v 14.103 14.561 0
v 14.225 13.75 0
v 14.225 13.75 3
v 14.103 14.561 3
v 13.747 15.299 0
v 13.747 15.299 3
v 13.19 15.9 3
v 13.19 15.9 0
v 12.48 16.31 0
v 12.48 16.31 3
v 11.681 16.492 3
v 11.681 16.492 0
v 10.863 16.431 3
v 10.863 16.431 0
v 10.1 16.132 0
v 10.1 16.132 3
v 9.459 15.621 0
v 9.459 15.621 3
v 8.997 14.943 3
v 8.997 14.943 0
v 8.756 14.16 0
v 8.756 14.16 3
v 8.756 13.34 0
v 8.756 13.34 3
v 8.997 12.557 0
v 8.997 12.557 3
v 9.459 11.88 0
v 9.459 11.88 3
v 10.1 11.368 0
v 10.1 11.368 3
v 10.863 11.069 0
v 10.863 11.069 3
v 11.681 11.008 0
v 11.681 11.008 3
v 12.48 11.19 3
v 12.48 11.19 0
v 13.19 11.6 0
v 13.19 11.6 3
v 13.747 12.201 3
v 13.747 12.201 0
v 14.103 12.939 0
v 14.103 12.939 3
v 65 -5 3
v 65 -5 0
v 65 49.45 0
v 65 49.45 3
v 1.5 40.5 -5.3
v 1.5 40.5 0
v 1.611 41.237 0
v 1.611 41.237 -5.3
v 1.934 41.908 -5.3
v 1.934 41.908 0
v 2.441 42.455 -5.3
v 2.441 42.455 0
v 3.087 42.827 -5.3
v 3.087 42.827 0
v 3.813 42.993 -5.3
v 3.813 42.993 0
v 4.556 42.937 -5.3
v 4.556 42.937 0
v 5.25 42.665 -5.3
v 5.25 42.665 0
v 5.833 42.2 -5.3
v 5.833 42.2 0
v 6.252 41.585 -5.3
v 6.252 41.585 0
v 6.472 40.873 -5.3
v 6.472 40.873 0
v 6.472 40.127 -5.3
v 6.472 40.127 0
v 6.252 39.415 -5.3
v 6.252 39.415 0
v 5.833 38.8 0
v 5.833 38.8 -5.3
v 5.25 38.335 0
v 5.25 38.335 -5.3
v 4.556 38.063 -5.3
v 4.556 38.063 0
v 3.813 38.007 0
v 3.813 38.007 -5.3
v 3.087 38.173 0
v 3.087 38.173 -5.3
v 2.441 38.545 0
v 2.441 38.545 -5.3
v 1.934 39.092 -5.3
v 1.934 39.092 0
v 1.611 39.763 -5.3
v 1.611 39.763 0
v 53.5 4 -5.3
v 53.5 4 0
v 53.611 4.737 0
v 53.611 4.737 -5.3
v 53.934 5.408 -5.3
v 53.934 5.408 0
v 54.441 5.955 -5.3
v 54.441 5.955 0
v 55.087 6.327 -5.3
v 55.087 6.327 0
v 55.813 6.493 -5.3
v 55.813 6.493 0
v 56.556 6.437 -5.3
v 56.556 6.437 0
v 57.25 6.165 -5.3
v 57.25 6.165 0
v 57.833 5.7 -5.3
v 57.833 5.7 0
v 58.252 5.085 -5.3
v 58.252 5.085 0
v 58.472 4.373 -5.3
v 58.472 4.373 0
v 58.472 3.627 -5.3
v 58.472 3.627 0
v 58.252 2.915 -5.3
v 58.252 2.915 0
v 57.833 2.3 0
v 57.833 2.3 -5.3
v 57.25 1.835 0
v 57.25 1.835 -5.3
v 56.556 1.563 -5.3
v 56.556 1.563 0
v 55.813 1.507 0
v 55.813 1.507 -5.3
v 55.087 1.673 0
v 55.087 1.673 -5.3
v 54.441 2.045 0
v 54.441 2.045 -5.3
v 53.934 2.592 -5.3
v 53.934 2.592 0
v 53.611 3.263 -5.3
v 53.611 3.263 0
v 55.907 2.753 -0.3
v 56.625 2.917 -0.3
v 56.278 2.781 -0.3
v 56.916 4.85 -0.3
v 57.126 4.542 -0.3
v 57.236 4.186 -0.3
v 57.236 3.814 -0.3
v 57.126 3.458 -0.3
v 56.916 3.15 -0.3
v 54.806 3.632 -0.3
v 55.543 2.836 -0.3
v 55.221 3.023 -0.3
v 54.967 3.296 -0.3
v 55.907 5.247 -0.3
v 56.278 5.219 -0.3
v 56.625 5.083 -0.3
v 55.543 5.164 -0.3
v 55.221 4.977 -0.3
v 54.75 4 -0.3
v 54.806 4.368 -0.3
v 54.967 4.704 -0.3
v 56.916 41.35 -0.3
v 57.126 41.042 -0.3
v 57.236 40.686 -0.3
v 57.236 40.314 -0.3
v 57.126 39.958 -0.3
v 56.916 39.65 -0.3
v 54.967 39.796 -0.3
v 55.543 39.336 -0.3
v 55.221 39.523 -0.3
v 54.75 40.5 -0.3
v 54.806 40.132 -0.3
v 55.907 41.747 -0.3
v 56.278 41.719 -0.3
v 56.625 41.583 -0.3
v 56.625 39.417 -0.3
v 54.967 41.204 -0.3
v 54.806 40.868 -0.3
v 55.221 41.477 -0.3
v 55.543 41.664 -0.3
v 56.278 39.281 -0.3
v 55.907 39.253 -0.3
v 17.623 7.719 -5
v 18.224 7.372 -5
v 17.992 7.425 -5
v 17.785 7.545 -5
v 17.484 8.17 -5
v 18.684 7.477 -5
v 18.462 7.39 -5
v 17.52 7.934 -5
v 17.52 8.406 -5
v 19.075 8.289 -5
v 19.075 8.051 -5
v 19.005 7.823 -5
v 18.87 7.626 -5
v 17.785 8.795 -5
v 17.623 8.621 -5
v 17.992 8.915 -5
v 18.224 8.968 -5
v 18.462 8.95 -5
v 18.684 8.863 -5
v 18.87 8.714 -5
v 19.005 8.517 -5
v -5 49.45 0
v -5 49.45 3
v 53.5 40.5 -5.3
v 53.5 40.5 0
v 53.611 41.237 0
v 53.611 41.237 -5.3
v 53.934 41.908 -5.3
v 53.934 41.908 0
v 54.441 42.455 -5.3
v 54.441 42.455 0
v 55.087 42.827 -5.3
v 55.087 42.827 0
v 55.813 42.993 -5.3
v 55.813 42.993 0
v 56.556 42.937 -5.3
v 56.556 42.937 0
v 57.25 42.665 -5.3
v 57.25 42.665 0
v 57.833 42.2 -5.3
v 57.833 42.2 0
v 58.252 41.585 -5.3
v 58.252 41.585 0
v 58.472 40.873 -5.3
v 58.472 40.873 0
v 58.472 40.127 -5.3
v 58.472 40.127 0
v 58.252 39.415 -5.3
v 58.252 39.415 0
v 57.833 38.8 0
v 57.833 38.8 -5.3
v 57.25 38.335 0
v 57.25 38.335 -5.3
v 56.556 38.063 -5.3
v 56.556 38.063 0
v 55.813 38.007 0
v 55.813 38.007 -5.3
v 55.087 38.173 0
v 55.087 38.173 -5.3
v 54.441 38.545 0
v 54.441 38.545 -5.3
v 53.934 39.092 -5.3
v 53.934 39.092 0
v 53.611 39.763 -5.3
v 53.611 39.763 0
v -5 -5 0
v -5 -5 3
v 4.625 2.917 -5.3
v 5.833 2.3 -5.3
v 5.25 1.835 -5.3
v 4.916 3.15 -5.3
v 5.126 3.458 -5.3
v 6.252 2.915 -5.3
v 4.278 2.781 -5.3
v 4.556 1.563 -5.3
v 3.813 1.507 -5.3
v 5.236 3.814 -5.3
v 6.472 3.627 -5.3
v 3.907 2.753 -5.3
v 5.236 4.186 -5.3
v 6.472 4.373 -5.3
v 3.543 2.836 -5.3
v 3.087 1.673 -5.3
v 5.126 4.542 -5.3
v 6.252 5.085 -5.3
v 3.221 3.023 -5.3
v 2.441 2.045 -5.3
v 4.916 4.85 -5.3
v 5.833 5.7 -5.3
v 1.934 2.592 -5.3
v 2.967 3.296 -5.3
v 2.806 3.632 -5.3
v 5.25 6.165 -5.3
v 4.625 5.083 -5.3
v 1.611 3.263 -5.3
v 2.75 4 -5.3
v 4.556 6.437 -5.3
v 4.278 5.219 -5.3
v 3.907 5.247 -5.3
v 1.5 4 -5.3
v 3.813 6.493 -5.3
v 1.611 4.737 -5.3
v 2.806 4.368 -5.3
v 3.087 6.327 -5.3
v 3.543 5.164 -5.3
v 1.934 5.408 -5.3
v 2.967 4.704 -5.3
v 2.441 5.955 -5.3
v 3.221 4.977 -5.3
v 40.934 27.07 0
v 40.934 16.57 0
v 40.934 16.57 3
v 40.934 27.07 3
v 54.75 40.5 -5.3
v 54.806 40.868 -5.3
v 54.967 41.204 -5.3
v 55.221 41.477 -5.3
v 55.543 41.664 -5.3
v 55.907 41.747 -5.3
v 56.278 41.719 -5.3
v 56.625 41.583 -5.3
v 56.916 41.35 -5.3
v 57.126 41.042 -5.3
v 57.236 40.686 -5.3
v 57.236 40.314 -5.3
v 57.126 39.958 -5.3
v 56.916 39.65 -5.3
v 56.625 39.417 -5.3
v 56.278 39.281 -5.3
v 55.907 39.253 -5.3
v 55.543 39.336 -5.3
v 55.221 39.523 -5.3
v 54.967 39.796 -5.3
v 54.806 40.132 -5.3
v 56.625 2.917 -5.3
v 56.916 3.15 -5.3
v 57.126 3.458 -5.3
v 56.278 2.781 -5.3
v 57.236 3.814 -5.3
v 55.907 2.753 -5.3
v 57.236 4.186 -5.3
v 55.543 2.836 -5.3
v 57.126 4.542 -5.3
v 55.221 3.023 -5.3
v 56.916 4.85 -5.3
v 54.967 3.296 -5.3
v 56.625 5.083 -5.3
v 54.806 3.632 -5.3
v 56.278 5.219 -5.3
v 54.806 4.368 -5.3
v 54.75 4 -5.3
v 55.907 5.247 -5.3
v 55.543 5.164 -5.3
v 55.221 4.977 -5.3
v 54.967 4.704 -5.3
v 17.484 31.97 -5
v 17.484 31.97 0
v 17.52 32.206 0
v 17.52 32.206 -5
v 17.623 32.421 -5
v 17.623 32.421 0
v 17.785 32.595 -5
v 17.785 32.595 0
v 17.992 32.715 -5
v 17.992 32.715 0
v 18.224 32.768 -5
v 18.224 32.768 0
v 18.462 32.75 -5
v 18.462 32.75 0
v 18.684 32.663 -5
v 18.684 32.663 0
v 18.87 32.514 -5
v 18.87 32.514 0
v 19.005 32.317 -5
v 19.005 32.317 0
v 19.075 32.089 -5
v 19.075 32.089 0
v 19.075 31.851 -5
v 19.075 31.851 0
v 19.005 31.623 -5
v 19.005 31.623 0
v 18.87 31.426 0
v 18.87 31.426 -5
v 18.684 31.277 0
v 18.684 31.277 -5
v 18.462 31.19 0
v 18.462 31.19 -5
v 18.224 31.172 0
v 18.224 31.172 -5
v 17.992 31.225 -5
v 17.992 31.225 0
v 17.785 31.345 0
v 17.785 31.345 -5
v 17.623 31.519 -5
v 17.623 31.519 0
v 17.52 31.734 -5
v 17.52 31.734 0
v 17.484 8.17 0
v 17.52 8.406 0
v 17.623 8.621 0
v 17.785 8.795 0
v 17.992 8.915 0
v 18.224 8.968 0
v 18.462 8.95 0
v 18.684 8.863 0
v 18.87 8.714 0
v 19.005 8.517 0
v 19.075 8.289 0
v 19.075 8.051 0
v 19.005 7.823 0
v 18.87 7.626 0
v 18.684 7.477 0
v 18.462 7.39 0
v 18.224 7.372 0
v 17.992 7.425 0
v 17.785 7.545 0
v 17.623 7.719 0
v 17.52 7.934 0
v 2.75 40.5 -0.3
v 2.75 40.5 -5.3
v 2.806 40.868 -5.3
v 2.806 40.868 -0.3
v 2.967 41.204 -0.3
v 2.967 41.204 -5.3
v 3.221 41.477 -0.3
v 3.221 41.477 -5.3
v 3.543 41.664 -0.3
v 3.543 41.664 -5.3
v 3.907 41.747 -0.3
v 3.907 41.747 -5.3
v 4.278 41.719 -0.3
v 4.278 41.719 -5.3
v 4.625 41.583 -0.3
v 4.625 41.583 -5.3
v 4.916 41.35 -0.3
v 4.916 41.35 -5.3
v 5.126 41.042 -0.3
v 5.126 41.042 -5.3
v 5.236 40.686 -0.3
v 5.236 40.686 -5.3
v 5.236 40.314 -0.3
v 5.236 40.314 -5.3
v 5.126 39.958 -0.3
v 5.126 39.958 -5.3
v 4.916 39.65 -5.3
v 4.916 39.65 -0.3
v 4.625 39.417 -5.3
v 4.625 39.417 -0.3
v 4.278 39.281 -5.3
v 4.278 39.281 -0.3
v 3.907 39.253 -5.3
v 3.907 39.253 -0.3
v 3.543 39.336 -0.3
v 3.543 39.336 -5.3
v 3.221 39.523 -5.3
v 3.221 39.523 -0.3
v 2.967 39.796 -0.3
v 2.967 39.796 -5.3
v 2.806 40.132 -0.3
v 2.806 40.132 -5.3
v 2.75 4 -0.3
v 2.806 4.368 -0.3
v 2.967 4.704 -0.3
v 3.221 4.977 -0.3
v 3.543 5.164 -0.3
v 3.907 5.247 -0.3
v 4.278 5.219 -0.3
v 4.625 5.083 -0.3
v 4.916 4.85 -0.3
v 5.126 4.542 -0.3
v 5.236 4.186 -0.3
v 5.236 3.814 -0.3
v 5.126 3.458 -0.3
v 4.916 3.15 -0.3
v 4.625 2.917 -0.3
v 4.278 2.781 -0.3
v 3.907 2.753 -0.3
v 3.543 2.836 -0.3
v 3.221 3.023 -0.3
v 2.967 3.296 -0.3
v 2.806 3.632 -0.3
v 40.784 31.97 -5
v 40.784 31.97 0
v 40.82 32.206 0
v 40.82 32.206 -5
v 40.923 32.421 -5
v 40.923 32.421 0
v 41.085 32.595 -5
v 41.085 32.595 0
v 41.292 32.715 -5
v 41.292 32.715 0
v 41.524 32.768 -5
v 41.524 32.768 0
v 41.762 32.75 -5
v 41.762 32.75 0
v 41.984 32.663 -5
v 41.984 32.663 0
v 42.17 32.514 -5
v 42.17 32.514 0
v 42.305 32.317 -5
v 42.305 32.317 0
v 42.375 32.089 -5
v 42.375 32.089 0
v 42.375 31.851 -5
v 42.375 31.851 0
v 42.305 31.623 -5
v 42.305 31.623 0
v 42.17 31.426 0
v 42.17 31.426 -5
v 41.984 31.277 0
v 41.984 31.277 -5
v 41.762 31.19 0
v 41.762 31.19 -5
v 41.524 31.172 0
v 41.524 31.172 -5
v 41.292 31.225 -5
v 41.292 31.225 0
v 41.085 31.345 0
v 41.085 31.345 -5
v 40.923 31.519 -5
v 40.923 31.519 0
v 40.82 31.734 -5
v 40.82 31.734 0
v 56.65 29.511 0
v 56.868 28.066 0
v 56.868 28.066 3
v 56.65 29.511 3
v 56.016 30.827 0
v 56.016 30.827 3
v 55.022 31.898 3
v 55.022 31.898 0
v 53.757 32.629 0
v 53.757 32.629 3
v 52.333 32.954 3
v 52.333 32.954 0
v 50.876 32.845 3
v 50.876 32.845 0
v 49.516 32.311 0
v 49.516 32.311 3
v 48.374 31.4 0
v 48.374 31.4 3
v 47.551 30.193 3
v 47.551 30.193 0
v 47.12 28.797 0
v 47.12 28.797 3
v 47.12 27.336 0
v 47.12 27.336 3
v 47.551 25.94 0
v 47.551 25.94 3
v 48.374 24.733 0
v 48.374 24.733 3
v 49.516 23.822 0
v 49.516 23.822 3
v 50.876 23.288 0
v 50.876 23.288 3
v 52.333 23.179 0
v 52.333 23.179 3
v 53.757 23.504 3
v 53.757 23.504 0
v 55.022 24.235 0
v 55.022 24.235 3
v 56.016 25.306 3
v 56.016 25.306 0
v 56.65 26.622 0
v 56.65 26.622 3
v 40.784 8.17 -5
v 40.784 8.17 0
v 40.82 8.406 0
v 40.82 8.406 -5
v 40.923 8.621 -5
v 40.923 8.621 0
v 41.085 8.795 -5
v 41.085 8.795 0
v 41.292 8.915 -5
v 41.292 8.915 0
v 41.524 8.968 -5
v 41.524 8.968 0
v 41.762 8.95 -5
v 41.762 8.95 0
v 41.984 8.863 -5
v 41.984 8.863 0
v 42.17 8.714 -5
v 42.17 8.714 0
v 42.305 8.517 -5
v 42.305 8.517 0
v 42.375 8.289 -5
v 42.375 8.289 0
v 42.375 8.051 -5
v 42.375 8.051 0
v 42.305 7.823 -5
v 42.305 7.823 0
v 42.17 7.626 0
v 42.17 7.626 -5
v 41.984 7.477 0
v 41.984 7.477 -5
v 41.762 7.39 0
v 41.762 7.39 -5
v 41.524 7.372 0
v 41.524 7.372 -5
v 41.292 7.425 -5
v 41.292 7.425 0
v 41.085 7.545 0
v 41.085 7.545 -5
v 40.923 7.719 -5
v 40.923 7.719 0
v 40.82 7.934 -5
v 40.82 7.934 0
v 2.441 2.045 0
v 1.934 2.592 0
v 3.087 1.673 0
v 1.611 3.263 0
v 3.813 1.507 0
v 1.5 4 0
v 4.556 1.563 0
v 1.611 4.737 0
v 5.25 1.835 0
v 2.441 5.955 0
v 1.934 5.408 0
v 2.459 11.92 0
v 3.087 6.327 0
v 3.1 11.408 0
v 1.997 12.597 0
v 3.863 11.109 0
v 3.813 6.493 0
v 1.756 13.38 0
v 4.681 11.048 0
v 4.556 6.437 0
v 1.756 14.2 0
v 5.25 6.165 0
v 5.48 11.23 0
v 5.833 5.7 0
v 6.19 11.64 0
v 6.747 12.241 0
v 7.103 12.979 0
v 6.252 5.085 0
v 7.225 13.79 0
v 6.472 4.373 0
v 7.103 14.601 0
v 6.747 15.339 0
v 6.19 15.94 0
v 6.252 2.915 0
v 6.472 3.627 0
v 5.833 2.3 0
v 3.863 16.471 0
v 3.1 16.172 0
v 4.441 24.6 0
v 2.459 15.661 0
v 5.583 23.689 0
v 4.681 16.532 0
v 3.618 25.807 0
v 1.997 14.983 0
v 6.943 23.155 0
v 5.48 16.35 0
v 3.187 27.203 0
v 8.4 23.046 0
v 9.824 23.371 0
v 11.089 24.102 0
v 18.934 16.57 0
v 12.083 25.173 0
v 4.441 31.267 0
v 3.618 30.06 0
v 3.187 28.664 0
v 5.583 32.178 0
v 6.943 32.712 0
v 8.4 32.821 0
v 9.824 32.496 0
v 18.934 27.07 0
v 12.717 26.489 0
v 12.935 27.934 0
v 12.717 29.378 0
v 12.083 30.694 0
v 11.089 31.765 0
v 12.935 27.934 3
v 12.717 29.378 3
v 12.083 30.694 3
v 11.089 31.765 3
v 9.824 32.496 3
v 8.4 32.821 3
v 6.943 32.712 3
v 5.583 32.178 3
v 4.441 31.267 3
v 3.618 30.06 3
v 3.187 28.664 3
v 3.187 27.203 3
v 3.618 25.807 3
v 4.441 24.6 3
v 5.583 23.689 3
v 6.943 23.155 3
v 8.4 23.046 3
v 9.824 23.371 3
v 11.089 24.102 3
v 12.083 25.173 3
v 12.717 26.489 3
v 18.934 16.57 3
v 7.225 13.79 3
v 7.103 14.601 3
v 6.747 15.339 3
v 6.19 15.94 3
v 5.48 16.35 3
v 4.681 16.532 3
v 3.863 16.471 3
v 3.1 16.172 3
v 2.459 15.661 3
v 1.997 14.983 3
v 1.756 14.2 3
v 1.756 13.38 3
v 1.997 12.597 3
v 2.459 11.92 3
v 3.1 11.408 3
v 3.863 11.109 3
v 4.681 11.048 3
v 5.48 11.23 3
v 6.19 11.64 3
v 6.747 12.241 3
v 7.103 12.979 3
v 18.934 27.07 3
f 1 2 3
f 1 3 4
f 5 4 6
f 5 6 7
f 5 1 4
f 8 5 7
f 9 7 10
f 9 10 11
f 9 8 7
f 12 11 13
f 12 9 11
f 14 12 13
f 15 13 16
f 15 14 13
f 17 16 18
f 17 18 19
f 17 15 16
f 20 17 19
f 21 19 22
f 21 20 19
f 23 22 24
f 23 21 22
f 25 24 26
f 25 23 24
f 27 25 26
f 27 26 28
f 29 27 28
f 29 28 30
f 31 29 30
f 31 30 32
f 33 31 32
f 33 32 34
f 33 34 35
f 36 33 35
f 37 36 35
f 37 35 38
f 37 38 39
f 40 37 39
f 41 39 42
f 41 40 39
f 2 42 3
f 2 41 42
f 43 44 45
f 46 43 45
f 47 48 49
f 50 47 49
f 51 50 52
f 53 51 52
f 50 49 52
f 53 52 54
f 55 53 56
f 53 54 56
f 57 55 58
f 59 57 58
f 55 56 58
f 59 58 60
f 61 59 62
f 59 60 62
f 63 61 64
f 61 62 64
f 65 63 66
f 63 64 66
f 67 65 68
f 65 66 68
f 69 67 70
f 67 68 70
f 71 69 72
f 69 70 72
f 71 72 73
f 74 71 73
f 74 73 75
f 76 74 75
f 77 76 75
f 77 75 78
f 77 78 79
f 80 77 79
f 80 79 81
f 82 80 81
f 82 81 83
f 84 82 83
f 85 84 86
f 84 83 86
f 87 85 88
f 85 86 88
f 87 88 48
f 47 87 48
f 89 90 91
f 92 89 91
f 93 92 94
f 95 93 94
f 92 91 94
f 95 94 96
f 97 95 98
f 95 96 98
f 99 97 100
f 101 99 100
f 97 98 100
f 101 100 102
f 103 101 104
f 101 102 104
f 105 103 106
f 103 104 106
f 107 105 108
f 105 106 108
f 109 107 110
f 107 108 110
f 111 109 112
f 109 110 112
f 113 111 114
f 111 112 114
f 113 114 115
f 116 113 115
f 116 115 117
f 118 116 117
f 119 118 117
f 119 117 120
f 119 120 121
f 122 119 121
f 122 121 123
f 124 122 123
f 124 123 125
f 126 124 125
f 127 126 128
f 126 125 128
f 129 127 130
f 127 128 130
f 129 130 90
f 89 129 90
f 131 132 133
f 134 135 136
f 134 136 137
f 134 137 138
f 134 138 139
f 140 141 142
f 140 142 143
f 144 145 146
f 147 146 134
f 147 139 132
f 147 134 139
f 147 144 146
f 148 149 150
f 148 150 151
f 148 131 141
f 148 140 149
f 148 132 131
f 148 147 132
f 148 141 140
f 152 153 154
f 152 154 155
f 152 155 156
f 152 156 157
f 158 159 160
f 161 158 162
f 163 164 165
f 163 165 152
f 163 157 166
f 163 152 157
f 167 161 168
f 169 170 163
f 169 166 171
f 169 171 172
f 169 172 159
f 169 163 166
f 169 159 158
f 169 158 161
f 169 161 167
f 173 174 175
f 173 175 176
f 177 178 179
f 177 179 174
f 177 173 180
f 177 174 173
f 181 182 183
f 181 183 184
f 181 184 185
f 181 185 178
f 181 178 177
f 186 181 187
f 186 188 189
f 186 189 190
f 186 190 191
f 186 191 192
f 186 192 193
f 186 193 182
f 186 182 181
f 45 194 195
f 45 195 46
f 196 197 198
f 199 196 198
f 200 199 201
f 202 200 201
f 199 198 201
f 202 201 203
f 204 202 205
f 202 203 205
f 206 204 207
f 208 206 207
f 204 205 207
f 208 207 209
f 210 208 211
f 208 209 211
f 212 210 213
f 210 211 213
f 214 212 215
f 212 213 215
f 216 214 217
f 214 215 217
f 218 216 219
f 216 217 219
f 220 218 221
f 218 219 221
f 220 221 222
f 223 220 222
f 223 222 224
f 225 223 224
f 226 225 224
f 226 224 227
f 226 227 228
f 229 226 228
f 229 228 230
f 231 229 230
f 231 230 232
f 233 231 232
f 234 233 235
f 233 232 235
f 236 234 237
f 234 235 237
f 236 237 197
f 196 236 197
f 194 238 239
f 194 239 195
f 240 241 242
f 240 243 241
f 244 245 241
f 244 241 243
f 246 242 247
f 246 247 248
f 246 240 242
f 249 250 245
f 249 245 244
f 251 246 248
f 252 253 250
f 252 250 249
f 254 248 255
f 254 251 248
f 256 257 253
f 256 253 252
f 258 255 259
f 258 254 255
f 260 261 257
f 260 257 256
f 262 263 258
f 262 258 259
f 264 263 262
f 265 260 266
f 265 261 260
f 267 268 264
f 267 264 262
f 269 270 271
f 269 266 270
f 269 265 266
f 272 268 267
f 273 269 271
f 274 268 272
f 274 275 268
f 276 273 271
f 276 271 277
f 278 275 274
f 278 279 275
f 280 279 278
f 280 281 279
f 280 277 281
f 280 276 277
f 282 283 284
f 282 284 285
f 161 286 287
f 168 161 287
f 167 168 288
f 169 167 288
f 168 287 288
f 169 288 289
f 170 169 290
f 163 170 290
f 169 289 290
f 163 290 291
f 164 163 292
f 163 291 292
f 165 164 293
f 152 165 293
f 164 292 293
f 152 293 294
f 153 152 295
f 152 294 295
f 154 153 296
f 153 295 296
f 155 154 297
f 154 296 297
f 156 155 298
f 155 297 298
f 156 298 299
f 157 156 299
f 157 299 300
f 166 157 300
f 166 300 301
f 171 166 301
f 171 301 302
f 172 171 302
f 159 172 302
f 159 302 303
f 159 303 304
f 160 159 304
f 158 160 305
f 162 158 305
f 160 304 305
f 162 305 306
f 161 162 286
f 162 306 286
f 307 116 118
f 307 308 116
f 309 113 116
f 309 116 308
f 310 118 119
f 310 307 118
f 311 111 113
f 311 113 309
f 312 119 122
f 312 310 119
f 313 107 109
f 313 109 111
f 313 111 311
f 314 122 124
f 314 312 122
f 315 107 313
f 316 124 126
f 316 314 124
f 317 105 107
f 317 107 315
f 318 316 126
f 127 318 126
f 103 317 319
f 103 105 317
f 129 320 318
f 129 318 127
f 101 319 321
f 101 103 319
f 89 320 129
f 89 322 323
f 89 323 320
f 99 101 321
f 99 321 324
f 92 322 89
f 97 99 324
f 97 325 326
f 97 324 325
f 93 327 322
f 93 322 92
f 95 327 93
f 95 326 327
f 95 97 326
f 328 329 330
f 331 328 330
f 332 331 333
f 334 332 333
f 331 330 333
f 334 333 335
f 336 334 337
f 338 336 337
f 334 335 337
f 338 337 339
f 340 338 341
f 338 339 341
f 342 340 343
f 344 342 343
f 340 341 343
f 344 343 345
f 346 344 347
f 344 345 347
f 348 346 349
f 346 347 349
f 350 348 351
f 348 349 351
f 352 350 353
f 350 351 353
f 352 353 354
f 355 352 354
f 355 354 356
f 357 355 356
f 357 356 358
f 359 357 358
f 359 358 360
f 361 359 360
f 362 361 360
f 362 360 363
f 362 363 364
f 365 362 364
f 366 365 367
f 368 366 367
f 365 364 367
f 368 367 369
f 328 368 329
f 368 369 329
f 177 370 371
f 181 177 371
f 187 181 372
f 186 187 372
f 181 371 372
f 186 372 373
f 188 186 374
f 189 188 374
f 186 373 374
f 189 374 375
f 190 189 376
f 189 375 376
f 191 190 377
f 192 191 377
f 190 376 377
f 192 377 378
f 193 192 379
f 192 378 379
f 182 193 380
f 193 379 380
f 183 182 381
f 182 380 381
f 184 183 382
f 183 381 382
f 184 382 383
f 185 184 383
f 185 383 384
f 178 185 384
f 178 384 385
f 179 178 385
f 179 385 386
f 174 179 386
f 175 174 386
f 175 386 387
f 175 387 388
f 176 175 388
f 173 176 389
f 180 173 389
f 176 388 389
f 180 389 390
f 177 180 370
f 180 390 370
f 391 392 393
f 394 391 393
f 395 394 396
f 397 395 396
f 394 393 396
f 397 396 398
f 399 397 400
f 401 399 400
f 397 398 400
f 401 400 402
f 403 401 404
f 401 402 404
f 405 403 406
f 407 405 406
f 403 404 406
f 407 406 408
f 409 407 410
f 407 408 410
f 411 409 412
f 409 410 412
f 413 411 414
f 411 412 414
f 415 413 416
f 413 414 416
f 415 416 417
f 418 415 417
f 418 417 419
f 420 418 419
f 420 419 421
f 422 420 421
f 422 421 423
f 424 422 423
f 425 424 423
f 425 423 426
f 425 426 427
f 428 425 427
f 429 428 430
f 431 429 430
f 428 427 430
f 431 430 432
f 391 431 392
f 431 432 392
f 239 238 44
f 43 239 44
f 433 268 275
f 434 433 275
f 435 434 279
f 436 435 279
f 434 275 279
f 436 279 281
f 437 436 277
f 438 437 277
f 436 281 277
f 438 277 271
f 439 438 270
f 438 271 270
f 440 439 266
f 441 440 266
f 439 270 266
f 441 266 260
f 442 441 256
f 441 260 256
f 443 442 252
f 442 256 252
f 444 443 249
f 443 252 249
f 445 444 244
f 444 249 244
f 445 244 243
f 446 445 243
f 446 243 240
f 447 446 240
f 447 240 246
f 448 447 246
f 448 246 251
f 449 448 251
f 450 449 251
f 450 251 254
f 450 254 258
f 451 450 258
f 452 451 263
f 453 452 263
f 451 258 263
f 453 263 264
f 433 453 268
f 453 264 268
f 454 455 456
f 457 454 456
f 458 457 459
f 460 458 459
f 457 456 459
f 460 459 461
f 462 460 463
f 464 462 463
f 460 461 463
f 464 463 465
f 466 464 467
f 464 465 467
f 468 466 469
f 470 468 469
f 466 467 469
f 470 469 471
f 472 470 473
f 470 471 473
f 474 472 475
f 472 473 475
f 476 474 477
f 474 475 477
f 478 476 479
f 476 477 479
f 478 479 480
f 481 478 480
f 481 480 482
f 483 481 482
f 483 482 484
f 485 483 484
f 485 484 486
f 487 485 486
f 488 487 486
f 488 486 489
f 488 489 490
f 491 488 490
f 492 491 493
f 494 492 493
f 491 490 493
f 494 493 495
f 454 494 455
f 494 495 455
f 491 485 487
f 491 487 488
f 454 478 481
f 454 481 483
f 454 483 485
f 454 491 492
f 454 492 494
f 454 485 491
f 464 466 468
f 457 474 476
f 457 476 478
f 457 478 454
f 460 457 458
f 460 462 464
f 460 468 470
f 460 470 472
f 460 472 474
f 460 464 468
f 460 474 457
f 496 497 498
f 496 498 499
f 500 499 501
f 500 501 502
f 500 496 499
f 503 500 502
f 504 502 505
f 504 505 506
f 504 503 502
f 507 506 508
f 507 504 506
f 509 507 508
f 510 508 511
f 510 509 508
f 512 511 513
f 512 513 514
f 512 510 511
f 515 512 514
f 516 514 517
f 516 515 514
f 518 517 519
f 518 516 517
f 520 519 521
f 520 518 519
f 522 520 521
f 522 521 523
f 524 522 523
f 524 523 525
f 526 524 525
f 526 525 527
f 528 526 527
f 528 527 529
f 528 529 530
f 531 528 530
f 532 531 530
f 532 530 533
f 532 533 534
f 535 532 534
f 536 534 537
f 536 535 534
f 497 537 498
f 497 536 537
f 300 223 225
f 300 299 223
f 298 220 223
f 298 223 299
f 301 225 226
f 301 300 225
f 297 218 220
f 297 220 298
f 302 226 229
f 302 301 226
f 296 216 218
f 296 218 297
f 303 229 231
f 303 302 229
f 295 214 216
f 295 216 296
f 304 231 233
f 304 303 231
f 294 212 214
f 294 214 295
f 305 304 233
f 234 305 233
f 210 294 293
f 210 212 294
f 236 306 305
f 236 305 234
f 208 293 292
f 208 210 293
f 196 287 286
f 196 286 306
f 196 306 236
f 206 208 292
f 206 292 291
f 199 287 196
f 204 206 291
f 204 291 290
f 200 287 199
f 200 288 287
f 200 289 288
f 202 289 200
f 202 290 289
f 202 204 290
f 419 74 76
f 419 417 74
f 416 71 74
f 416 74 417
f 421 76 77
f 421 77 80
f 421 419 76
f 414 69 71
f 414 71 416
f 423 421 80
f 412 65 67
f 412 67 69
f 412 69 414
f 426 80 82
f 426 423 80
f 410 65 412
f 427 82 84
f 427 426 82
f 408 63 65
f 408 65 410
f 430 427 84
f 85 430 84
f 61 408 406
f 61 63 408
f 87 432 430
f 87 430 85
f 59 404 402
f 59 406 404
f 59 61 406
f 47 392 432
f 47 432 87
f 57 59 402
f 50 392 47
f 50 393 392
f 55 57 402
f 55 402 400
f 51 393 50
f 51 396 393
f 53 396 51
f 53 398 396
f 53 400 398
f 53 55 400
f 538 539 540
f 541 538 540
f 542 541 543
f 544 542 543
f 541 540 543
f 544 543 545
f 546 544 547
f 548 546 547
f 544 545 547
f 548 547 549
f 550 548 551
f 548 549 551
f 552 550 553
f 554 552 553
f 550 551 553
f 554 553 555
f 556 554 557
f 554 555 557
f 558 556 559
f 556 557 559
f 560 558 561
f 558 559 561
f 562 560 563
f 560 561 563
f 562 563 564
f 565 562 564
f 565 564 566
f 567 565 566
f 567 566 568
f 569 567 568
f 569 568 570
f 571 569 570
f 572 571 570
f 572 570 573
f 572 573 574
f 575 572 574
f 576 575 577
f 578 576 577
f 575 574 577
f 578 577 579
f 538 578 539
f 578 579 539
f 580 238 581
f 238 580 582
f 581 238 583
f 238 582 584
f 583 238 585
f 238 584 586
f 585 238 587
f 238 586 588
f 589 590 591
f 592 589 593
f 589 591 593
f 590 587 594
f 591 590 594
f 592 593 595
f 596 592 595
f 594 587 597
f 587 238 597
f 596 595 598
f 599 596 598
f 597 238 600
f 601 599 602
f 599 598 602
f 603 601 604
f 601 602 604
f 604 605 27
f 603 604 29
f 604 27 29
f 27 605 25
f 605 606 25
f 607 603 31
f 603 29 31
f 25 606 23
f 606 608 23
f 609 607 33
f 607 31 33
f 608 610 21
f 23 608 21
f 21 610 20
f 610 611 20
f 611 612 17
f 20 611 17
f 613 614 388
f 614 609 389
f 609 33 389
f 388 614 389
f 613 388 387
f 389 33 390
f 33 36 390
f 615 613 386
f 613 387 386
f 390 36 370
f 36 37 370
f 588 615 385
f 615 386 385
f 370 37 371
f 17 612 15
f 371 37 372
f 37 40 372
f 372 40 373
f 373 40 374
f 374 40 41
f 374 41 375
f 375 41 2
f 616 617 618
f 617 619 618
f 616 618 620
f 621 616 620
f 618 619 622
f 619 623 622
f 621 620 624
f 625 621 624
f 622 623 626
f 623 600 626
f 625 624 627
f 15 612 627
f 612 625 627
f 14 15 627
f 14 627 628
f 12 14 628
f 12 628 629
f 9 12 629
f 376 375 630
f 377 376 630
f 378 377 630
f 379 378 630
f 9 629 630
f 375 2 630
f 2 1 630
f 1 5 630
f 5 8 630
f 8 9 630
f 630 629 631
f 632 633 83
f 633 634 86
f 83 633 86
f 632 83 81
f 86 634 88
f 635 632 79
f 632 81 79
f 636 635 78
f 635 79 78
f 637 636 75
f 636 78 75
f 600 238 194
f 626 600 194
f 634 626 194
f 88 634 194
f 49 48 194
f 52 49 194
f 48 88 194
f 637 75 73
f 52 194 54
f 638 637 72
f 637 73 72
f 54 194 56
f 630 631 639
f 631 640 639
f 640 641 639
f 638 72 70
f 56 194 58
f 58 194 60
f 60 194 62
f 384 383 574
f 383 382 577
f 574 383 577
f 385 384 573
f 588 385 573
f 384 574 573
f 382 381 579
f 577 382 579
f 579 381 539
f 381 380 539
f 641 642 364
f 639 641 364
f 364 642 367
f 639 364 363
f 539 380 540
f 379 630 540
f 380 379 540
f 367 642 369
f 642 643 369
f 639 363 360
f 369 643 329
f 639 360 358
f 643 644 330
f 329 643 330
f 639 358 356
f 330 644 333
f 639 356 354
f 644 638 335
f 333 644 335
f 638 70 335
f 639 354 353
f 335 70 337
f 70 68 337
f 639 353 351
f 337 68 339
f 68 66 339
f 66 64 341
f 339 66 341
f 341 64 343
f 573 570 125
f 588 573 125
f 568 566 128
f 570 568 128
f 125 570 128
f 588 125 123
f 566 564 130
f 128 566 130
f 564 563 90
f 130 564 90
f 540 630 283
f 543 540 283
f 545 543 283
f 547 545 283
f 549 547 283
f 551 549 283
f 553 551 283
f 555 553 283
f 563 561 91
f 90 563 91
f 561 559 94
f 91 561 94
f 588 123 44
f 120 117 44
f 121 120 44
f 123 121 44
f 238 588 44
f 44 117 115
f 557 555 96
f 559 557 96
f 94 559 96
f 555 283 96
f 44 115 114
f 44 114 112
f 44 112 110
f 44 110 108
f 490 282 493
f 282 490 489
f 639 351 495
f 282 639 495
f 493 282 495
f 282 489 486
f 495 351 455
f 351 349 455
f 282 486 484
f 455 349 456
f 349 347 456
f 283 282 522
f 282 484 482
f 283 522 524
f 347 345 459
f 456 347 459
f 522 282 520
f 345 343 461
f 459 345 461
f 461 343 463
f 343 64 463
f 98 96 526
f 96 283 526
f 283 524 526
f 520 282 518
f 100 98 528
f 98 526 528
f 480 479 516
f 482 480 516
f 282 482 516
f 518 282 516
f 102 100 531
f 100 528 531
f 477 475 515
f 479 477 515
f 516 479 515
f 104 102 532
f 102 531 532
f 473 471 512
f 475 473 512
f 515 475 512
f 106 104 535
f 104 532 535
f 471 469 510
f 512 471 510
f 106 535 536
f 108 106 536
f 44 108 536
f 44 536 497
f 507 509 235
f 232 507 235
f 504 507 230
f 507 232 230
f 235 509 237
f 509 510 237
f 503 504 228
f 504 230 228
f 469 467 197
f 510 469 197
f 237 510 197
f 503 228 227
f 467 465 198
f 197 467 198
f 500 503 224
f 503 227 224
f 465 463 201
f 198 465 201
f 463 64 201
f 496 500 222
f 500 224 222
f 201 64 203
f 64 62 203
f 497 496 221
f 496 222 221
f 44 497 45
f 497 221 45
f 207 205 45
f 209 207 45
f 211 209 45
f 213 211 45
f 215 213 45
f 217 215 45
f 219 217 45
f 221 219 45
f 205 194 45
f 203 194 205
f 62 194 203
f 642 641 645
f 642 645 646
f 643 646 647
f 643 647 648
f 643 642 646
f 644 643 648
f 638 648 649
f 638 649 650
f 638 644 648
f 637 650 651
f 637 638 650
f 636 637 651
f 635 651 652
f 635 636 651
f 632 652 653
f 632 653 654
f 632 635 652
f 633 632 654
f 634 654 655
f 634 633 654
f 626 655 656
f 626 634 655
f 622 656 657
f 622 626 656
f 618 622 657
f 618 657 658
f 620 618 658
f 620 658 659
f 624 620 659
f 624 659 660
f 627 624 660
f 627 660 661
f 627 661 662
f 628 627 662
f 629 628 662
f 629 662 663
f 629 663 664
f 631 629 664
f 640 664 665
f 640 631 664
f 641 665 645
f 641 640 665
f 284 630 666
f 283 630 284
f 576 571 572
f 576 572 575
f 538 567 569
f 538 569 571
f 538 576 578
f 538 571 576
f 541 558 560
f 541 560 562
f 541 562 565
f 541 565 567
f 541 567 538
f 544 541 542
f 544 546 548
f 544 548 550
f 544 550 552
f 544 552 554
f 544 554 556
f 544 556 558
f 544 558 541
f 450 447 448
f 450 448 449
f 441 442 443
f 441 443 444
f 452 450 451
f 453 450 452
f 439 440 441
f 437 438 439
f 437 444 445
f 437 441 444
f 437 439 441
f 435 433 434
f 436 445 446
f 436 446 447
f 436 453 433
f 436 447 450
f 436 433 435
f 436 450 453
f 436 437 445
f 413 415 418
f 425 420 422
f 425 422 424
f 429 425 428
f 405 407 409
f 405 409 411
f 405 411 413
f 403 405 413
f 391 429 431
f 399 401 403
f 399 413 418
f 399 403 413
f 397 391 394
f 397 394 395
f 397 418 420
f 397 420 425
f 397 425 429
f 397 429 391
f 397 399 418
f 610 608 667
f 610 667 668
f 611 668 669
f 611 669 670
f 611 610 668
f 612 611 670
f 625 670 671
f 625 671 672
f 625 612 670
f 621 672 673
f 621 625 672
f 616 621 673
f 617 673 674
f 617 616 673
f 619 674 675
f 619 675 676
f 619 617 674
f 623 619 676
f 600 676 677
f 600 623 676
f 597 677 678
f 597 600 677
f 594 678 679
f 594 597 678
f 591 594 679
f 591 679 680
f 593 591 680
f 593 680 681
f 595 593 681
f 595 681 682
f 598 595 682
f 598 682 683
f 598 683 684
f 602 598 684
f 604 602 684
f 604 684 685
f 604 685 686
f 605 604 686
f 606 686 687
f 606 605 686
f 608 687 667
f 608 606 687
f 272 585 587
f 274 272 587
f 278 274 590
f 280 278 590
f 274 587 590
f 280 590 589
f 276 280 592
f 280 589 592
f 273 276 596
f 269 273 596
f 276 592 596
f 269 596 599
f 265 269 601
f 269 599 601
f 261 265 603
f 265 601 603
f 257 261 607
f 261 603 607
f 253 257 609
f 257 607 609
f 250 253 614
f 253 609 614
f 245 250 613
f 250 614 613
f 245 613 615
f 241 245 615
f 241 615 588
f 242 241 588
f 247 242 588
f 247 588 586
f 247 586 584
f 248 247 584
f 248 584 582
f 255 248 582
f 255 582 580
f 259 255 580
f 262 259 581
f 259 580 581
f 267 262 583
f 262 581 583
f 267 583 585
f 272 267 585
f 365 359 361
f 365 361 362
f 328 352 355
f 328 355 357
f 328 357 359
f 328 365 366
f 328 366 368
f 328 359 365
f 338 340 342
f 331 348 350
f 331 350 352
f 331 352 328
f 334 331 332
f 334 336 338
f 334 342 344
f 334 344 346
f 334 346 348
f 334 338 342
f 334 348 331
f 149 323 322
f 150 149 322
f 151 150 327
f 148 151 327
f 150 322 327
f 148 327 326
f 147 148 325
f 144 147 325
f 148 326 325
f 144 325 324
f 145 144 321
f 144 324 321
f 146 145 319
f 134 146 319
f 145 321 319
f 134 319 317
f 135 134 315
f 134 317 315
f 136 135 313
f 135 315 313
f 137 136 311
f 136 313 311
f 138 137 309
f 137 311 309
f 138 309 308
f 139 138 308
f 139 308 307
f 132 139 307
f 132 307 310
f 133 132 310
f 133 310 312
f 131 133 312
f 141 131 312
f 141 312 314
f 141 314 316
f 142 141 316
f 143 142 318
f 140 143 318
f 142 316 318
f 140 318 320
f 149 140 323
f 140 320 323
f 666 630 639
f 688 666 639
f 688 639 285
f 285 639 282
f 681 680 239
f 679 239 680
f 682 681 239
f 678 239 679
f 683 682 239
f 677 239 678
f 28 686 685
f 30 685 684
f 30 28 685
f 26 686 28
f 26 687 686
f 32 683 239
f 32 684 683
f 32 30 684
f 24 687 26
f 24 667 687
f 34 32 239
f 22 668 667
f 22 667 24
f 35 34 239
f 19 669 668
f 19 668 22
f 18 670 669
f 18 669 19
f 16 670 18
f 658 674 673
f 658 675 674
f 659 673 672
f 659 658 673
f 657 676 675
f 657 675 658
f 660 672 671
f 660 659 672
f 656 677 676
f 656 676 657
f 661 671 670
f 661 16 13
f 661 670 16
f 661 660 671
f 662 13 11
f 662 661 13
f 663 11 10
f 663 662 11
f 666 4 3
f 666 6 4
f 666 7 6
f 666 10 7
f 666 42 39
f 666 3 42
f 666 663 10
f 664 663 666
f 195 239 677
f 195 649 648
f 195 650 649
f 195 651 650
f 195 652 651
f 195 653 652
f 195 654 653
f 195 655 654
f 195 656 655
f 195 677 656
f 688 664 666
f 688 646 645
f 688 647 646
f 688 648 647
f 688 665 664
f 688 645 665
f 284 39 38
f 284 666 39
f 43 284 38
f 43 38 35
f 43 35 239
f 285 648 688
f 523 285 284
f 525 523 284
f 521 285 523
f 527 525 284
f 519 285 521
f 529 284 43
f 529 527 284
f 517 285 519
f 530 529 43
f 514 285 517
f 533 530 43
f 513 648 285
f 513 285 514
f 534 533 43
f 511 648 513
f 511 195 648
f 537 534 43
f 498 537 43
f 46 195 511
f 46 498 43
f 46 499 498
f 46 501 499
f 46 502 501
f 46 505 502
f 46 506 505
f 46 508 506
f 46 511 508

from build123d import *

# Parameters (mm, degrees)
SZKIC1_W                    = 70.000011125
SZKIC1_H                    = 54.450044047
SZKIC1_R                    = 4.901215244
SZKIC1_R_2                  = 2.75
SZKIC1_W_2                  = 22
SZKIC1_H_2                  = 10.5
DODANIE_WYCI_GNI_CIE2_DEPTH = 3
SZKIC3_R                    = 2.5
DODANIE_WYCI_GNI_CIE3_DEPTH = 5.3
SZKIC5_R                    = 1.25
WYTNIJ_WYCI_GNI_CIE1_DEPTH  = 5
SZKIC6_R                    = 0.8
DODANIE_WYCI_GNI_CIE4_DEPTH = 5


with BuildPart() as part:
    # Szkic1 → Dodanie-wyciągnięcie2 (new body)
    with BuildSketch(Plane.XY):
        with Locations((29.999994437, 22.225000357)):
            Rectangle(SZKIC1_W, SZKIC1_H)
        with Locations((8.033600802, 27.9335383)):
            Circle(SZKIC1_R, mode=Mode.SUBTRACT)
        with Locations((51.966399076, 28.066461662)):
            Circle(SZKIC1_R, mode=Mode.SUBTRACT)
        with Locations((4.47500206, 13.790057549)):
            Circle(SZKIC1_R_2, mode=Mode.SUBTRACT)
        with Locations((11.475021134, 13.75003756)):
            Circle(SZKIC1_R_2, mode=Mode.SUBTRACT)
        with Locations((29.933998796, 21.819981485)):
            Rectangle(SZKIC1_W_2, SZKIC1_H_2, mode=Mode.SUBTRACT)
    extrude(amount=DODANIE_WYCI_GNI_CIE2_DEPTH)

    # Szkic3 → Dodanie-wyciągnięcie3 (add)
    with BuildSketch(Plane(origin=(0, 0, 0), x_dir=(-1, 0, 0), z_dir=(0, 0, -1))):
        with Locations((-55.99999976, 40.50000028)):
            Circle(SZKIC3_R)
        with Locations((-3.99999962, 40.50000028)):
            Circle(SZKIC3_R)
        with Locations((-55.99999976, 3.99999962)):
            Circle(SZKIC3_R)
        with Locations((-3.99999962, 3.99999962)):
            Circle(SZKIC3_R)
    extrude(amount=DODANIE_WYCI_GNI_CIE3_DEPTH)

    # Szkic5 → Wytnij-wyciągnięcie1 (cut)
    with BuildSketch(Plane(origin=(0, 0, -5.3), x_dir=(-1, 0, 0), z_dir=(0, 0, -1))):
        with Locations((-55.99999976, 40.50000028)):
            Circle(SZKIC5_R)
        with Locations((-3.99999962, 40.50000028)):
            Circle(SZKIC5_R)
        with Locations((-55.99999976, 3.99999962)):
            Circle(SZKIC5_R)
        with Locations((-3.99999962, 3.99999962)):
            Circle(SZKIC5_R)
    extrude(amount=-WYTNIJ_WYCI_GNI_CIE1_DEPTH, mode=Mode.SUBTRACT)

    # Szkic6 → Dodanie-wyciągnięcie4 (add)
    with BuildSketch(Plane(origin=(0, 0, 0), x_dir=(-1, 0, 0), z_dir=(0, 0, -1))):
        with Locations((-41.583998796, 31.969981485)):
            Circle(SZKIC6_R)
        with Locations((-18.283998796, 31.969981485)):
            Circle(SZKIC6_R)
        with Locations((-41.583998796, 8.169981485)):
            Circle(SZKIC6_R)
        with Locations((-18.283998796, 8.169981485)):
            Circle(SZKIC6_R)
    extrude(amount=DODANIE_WYCI_GNI_CIE4_DEPTH)


solid = part.part
